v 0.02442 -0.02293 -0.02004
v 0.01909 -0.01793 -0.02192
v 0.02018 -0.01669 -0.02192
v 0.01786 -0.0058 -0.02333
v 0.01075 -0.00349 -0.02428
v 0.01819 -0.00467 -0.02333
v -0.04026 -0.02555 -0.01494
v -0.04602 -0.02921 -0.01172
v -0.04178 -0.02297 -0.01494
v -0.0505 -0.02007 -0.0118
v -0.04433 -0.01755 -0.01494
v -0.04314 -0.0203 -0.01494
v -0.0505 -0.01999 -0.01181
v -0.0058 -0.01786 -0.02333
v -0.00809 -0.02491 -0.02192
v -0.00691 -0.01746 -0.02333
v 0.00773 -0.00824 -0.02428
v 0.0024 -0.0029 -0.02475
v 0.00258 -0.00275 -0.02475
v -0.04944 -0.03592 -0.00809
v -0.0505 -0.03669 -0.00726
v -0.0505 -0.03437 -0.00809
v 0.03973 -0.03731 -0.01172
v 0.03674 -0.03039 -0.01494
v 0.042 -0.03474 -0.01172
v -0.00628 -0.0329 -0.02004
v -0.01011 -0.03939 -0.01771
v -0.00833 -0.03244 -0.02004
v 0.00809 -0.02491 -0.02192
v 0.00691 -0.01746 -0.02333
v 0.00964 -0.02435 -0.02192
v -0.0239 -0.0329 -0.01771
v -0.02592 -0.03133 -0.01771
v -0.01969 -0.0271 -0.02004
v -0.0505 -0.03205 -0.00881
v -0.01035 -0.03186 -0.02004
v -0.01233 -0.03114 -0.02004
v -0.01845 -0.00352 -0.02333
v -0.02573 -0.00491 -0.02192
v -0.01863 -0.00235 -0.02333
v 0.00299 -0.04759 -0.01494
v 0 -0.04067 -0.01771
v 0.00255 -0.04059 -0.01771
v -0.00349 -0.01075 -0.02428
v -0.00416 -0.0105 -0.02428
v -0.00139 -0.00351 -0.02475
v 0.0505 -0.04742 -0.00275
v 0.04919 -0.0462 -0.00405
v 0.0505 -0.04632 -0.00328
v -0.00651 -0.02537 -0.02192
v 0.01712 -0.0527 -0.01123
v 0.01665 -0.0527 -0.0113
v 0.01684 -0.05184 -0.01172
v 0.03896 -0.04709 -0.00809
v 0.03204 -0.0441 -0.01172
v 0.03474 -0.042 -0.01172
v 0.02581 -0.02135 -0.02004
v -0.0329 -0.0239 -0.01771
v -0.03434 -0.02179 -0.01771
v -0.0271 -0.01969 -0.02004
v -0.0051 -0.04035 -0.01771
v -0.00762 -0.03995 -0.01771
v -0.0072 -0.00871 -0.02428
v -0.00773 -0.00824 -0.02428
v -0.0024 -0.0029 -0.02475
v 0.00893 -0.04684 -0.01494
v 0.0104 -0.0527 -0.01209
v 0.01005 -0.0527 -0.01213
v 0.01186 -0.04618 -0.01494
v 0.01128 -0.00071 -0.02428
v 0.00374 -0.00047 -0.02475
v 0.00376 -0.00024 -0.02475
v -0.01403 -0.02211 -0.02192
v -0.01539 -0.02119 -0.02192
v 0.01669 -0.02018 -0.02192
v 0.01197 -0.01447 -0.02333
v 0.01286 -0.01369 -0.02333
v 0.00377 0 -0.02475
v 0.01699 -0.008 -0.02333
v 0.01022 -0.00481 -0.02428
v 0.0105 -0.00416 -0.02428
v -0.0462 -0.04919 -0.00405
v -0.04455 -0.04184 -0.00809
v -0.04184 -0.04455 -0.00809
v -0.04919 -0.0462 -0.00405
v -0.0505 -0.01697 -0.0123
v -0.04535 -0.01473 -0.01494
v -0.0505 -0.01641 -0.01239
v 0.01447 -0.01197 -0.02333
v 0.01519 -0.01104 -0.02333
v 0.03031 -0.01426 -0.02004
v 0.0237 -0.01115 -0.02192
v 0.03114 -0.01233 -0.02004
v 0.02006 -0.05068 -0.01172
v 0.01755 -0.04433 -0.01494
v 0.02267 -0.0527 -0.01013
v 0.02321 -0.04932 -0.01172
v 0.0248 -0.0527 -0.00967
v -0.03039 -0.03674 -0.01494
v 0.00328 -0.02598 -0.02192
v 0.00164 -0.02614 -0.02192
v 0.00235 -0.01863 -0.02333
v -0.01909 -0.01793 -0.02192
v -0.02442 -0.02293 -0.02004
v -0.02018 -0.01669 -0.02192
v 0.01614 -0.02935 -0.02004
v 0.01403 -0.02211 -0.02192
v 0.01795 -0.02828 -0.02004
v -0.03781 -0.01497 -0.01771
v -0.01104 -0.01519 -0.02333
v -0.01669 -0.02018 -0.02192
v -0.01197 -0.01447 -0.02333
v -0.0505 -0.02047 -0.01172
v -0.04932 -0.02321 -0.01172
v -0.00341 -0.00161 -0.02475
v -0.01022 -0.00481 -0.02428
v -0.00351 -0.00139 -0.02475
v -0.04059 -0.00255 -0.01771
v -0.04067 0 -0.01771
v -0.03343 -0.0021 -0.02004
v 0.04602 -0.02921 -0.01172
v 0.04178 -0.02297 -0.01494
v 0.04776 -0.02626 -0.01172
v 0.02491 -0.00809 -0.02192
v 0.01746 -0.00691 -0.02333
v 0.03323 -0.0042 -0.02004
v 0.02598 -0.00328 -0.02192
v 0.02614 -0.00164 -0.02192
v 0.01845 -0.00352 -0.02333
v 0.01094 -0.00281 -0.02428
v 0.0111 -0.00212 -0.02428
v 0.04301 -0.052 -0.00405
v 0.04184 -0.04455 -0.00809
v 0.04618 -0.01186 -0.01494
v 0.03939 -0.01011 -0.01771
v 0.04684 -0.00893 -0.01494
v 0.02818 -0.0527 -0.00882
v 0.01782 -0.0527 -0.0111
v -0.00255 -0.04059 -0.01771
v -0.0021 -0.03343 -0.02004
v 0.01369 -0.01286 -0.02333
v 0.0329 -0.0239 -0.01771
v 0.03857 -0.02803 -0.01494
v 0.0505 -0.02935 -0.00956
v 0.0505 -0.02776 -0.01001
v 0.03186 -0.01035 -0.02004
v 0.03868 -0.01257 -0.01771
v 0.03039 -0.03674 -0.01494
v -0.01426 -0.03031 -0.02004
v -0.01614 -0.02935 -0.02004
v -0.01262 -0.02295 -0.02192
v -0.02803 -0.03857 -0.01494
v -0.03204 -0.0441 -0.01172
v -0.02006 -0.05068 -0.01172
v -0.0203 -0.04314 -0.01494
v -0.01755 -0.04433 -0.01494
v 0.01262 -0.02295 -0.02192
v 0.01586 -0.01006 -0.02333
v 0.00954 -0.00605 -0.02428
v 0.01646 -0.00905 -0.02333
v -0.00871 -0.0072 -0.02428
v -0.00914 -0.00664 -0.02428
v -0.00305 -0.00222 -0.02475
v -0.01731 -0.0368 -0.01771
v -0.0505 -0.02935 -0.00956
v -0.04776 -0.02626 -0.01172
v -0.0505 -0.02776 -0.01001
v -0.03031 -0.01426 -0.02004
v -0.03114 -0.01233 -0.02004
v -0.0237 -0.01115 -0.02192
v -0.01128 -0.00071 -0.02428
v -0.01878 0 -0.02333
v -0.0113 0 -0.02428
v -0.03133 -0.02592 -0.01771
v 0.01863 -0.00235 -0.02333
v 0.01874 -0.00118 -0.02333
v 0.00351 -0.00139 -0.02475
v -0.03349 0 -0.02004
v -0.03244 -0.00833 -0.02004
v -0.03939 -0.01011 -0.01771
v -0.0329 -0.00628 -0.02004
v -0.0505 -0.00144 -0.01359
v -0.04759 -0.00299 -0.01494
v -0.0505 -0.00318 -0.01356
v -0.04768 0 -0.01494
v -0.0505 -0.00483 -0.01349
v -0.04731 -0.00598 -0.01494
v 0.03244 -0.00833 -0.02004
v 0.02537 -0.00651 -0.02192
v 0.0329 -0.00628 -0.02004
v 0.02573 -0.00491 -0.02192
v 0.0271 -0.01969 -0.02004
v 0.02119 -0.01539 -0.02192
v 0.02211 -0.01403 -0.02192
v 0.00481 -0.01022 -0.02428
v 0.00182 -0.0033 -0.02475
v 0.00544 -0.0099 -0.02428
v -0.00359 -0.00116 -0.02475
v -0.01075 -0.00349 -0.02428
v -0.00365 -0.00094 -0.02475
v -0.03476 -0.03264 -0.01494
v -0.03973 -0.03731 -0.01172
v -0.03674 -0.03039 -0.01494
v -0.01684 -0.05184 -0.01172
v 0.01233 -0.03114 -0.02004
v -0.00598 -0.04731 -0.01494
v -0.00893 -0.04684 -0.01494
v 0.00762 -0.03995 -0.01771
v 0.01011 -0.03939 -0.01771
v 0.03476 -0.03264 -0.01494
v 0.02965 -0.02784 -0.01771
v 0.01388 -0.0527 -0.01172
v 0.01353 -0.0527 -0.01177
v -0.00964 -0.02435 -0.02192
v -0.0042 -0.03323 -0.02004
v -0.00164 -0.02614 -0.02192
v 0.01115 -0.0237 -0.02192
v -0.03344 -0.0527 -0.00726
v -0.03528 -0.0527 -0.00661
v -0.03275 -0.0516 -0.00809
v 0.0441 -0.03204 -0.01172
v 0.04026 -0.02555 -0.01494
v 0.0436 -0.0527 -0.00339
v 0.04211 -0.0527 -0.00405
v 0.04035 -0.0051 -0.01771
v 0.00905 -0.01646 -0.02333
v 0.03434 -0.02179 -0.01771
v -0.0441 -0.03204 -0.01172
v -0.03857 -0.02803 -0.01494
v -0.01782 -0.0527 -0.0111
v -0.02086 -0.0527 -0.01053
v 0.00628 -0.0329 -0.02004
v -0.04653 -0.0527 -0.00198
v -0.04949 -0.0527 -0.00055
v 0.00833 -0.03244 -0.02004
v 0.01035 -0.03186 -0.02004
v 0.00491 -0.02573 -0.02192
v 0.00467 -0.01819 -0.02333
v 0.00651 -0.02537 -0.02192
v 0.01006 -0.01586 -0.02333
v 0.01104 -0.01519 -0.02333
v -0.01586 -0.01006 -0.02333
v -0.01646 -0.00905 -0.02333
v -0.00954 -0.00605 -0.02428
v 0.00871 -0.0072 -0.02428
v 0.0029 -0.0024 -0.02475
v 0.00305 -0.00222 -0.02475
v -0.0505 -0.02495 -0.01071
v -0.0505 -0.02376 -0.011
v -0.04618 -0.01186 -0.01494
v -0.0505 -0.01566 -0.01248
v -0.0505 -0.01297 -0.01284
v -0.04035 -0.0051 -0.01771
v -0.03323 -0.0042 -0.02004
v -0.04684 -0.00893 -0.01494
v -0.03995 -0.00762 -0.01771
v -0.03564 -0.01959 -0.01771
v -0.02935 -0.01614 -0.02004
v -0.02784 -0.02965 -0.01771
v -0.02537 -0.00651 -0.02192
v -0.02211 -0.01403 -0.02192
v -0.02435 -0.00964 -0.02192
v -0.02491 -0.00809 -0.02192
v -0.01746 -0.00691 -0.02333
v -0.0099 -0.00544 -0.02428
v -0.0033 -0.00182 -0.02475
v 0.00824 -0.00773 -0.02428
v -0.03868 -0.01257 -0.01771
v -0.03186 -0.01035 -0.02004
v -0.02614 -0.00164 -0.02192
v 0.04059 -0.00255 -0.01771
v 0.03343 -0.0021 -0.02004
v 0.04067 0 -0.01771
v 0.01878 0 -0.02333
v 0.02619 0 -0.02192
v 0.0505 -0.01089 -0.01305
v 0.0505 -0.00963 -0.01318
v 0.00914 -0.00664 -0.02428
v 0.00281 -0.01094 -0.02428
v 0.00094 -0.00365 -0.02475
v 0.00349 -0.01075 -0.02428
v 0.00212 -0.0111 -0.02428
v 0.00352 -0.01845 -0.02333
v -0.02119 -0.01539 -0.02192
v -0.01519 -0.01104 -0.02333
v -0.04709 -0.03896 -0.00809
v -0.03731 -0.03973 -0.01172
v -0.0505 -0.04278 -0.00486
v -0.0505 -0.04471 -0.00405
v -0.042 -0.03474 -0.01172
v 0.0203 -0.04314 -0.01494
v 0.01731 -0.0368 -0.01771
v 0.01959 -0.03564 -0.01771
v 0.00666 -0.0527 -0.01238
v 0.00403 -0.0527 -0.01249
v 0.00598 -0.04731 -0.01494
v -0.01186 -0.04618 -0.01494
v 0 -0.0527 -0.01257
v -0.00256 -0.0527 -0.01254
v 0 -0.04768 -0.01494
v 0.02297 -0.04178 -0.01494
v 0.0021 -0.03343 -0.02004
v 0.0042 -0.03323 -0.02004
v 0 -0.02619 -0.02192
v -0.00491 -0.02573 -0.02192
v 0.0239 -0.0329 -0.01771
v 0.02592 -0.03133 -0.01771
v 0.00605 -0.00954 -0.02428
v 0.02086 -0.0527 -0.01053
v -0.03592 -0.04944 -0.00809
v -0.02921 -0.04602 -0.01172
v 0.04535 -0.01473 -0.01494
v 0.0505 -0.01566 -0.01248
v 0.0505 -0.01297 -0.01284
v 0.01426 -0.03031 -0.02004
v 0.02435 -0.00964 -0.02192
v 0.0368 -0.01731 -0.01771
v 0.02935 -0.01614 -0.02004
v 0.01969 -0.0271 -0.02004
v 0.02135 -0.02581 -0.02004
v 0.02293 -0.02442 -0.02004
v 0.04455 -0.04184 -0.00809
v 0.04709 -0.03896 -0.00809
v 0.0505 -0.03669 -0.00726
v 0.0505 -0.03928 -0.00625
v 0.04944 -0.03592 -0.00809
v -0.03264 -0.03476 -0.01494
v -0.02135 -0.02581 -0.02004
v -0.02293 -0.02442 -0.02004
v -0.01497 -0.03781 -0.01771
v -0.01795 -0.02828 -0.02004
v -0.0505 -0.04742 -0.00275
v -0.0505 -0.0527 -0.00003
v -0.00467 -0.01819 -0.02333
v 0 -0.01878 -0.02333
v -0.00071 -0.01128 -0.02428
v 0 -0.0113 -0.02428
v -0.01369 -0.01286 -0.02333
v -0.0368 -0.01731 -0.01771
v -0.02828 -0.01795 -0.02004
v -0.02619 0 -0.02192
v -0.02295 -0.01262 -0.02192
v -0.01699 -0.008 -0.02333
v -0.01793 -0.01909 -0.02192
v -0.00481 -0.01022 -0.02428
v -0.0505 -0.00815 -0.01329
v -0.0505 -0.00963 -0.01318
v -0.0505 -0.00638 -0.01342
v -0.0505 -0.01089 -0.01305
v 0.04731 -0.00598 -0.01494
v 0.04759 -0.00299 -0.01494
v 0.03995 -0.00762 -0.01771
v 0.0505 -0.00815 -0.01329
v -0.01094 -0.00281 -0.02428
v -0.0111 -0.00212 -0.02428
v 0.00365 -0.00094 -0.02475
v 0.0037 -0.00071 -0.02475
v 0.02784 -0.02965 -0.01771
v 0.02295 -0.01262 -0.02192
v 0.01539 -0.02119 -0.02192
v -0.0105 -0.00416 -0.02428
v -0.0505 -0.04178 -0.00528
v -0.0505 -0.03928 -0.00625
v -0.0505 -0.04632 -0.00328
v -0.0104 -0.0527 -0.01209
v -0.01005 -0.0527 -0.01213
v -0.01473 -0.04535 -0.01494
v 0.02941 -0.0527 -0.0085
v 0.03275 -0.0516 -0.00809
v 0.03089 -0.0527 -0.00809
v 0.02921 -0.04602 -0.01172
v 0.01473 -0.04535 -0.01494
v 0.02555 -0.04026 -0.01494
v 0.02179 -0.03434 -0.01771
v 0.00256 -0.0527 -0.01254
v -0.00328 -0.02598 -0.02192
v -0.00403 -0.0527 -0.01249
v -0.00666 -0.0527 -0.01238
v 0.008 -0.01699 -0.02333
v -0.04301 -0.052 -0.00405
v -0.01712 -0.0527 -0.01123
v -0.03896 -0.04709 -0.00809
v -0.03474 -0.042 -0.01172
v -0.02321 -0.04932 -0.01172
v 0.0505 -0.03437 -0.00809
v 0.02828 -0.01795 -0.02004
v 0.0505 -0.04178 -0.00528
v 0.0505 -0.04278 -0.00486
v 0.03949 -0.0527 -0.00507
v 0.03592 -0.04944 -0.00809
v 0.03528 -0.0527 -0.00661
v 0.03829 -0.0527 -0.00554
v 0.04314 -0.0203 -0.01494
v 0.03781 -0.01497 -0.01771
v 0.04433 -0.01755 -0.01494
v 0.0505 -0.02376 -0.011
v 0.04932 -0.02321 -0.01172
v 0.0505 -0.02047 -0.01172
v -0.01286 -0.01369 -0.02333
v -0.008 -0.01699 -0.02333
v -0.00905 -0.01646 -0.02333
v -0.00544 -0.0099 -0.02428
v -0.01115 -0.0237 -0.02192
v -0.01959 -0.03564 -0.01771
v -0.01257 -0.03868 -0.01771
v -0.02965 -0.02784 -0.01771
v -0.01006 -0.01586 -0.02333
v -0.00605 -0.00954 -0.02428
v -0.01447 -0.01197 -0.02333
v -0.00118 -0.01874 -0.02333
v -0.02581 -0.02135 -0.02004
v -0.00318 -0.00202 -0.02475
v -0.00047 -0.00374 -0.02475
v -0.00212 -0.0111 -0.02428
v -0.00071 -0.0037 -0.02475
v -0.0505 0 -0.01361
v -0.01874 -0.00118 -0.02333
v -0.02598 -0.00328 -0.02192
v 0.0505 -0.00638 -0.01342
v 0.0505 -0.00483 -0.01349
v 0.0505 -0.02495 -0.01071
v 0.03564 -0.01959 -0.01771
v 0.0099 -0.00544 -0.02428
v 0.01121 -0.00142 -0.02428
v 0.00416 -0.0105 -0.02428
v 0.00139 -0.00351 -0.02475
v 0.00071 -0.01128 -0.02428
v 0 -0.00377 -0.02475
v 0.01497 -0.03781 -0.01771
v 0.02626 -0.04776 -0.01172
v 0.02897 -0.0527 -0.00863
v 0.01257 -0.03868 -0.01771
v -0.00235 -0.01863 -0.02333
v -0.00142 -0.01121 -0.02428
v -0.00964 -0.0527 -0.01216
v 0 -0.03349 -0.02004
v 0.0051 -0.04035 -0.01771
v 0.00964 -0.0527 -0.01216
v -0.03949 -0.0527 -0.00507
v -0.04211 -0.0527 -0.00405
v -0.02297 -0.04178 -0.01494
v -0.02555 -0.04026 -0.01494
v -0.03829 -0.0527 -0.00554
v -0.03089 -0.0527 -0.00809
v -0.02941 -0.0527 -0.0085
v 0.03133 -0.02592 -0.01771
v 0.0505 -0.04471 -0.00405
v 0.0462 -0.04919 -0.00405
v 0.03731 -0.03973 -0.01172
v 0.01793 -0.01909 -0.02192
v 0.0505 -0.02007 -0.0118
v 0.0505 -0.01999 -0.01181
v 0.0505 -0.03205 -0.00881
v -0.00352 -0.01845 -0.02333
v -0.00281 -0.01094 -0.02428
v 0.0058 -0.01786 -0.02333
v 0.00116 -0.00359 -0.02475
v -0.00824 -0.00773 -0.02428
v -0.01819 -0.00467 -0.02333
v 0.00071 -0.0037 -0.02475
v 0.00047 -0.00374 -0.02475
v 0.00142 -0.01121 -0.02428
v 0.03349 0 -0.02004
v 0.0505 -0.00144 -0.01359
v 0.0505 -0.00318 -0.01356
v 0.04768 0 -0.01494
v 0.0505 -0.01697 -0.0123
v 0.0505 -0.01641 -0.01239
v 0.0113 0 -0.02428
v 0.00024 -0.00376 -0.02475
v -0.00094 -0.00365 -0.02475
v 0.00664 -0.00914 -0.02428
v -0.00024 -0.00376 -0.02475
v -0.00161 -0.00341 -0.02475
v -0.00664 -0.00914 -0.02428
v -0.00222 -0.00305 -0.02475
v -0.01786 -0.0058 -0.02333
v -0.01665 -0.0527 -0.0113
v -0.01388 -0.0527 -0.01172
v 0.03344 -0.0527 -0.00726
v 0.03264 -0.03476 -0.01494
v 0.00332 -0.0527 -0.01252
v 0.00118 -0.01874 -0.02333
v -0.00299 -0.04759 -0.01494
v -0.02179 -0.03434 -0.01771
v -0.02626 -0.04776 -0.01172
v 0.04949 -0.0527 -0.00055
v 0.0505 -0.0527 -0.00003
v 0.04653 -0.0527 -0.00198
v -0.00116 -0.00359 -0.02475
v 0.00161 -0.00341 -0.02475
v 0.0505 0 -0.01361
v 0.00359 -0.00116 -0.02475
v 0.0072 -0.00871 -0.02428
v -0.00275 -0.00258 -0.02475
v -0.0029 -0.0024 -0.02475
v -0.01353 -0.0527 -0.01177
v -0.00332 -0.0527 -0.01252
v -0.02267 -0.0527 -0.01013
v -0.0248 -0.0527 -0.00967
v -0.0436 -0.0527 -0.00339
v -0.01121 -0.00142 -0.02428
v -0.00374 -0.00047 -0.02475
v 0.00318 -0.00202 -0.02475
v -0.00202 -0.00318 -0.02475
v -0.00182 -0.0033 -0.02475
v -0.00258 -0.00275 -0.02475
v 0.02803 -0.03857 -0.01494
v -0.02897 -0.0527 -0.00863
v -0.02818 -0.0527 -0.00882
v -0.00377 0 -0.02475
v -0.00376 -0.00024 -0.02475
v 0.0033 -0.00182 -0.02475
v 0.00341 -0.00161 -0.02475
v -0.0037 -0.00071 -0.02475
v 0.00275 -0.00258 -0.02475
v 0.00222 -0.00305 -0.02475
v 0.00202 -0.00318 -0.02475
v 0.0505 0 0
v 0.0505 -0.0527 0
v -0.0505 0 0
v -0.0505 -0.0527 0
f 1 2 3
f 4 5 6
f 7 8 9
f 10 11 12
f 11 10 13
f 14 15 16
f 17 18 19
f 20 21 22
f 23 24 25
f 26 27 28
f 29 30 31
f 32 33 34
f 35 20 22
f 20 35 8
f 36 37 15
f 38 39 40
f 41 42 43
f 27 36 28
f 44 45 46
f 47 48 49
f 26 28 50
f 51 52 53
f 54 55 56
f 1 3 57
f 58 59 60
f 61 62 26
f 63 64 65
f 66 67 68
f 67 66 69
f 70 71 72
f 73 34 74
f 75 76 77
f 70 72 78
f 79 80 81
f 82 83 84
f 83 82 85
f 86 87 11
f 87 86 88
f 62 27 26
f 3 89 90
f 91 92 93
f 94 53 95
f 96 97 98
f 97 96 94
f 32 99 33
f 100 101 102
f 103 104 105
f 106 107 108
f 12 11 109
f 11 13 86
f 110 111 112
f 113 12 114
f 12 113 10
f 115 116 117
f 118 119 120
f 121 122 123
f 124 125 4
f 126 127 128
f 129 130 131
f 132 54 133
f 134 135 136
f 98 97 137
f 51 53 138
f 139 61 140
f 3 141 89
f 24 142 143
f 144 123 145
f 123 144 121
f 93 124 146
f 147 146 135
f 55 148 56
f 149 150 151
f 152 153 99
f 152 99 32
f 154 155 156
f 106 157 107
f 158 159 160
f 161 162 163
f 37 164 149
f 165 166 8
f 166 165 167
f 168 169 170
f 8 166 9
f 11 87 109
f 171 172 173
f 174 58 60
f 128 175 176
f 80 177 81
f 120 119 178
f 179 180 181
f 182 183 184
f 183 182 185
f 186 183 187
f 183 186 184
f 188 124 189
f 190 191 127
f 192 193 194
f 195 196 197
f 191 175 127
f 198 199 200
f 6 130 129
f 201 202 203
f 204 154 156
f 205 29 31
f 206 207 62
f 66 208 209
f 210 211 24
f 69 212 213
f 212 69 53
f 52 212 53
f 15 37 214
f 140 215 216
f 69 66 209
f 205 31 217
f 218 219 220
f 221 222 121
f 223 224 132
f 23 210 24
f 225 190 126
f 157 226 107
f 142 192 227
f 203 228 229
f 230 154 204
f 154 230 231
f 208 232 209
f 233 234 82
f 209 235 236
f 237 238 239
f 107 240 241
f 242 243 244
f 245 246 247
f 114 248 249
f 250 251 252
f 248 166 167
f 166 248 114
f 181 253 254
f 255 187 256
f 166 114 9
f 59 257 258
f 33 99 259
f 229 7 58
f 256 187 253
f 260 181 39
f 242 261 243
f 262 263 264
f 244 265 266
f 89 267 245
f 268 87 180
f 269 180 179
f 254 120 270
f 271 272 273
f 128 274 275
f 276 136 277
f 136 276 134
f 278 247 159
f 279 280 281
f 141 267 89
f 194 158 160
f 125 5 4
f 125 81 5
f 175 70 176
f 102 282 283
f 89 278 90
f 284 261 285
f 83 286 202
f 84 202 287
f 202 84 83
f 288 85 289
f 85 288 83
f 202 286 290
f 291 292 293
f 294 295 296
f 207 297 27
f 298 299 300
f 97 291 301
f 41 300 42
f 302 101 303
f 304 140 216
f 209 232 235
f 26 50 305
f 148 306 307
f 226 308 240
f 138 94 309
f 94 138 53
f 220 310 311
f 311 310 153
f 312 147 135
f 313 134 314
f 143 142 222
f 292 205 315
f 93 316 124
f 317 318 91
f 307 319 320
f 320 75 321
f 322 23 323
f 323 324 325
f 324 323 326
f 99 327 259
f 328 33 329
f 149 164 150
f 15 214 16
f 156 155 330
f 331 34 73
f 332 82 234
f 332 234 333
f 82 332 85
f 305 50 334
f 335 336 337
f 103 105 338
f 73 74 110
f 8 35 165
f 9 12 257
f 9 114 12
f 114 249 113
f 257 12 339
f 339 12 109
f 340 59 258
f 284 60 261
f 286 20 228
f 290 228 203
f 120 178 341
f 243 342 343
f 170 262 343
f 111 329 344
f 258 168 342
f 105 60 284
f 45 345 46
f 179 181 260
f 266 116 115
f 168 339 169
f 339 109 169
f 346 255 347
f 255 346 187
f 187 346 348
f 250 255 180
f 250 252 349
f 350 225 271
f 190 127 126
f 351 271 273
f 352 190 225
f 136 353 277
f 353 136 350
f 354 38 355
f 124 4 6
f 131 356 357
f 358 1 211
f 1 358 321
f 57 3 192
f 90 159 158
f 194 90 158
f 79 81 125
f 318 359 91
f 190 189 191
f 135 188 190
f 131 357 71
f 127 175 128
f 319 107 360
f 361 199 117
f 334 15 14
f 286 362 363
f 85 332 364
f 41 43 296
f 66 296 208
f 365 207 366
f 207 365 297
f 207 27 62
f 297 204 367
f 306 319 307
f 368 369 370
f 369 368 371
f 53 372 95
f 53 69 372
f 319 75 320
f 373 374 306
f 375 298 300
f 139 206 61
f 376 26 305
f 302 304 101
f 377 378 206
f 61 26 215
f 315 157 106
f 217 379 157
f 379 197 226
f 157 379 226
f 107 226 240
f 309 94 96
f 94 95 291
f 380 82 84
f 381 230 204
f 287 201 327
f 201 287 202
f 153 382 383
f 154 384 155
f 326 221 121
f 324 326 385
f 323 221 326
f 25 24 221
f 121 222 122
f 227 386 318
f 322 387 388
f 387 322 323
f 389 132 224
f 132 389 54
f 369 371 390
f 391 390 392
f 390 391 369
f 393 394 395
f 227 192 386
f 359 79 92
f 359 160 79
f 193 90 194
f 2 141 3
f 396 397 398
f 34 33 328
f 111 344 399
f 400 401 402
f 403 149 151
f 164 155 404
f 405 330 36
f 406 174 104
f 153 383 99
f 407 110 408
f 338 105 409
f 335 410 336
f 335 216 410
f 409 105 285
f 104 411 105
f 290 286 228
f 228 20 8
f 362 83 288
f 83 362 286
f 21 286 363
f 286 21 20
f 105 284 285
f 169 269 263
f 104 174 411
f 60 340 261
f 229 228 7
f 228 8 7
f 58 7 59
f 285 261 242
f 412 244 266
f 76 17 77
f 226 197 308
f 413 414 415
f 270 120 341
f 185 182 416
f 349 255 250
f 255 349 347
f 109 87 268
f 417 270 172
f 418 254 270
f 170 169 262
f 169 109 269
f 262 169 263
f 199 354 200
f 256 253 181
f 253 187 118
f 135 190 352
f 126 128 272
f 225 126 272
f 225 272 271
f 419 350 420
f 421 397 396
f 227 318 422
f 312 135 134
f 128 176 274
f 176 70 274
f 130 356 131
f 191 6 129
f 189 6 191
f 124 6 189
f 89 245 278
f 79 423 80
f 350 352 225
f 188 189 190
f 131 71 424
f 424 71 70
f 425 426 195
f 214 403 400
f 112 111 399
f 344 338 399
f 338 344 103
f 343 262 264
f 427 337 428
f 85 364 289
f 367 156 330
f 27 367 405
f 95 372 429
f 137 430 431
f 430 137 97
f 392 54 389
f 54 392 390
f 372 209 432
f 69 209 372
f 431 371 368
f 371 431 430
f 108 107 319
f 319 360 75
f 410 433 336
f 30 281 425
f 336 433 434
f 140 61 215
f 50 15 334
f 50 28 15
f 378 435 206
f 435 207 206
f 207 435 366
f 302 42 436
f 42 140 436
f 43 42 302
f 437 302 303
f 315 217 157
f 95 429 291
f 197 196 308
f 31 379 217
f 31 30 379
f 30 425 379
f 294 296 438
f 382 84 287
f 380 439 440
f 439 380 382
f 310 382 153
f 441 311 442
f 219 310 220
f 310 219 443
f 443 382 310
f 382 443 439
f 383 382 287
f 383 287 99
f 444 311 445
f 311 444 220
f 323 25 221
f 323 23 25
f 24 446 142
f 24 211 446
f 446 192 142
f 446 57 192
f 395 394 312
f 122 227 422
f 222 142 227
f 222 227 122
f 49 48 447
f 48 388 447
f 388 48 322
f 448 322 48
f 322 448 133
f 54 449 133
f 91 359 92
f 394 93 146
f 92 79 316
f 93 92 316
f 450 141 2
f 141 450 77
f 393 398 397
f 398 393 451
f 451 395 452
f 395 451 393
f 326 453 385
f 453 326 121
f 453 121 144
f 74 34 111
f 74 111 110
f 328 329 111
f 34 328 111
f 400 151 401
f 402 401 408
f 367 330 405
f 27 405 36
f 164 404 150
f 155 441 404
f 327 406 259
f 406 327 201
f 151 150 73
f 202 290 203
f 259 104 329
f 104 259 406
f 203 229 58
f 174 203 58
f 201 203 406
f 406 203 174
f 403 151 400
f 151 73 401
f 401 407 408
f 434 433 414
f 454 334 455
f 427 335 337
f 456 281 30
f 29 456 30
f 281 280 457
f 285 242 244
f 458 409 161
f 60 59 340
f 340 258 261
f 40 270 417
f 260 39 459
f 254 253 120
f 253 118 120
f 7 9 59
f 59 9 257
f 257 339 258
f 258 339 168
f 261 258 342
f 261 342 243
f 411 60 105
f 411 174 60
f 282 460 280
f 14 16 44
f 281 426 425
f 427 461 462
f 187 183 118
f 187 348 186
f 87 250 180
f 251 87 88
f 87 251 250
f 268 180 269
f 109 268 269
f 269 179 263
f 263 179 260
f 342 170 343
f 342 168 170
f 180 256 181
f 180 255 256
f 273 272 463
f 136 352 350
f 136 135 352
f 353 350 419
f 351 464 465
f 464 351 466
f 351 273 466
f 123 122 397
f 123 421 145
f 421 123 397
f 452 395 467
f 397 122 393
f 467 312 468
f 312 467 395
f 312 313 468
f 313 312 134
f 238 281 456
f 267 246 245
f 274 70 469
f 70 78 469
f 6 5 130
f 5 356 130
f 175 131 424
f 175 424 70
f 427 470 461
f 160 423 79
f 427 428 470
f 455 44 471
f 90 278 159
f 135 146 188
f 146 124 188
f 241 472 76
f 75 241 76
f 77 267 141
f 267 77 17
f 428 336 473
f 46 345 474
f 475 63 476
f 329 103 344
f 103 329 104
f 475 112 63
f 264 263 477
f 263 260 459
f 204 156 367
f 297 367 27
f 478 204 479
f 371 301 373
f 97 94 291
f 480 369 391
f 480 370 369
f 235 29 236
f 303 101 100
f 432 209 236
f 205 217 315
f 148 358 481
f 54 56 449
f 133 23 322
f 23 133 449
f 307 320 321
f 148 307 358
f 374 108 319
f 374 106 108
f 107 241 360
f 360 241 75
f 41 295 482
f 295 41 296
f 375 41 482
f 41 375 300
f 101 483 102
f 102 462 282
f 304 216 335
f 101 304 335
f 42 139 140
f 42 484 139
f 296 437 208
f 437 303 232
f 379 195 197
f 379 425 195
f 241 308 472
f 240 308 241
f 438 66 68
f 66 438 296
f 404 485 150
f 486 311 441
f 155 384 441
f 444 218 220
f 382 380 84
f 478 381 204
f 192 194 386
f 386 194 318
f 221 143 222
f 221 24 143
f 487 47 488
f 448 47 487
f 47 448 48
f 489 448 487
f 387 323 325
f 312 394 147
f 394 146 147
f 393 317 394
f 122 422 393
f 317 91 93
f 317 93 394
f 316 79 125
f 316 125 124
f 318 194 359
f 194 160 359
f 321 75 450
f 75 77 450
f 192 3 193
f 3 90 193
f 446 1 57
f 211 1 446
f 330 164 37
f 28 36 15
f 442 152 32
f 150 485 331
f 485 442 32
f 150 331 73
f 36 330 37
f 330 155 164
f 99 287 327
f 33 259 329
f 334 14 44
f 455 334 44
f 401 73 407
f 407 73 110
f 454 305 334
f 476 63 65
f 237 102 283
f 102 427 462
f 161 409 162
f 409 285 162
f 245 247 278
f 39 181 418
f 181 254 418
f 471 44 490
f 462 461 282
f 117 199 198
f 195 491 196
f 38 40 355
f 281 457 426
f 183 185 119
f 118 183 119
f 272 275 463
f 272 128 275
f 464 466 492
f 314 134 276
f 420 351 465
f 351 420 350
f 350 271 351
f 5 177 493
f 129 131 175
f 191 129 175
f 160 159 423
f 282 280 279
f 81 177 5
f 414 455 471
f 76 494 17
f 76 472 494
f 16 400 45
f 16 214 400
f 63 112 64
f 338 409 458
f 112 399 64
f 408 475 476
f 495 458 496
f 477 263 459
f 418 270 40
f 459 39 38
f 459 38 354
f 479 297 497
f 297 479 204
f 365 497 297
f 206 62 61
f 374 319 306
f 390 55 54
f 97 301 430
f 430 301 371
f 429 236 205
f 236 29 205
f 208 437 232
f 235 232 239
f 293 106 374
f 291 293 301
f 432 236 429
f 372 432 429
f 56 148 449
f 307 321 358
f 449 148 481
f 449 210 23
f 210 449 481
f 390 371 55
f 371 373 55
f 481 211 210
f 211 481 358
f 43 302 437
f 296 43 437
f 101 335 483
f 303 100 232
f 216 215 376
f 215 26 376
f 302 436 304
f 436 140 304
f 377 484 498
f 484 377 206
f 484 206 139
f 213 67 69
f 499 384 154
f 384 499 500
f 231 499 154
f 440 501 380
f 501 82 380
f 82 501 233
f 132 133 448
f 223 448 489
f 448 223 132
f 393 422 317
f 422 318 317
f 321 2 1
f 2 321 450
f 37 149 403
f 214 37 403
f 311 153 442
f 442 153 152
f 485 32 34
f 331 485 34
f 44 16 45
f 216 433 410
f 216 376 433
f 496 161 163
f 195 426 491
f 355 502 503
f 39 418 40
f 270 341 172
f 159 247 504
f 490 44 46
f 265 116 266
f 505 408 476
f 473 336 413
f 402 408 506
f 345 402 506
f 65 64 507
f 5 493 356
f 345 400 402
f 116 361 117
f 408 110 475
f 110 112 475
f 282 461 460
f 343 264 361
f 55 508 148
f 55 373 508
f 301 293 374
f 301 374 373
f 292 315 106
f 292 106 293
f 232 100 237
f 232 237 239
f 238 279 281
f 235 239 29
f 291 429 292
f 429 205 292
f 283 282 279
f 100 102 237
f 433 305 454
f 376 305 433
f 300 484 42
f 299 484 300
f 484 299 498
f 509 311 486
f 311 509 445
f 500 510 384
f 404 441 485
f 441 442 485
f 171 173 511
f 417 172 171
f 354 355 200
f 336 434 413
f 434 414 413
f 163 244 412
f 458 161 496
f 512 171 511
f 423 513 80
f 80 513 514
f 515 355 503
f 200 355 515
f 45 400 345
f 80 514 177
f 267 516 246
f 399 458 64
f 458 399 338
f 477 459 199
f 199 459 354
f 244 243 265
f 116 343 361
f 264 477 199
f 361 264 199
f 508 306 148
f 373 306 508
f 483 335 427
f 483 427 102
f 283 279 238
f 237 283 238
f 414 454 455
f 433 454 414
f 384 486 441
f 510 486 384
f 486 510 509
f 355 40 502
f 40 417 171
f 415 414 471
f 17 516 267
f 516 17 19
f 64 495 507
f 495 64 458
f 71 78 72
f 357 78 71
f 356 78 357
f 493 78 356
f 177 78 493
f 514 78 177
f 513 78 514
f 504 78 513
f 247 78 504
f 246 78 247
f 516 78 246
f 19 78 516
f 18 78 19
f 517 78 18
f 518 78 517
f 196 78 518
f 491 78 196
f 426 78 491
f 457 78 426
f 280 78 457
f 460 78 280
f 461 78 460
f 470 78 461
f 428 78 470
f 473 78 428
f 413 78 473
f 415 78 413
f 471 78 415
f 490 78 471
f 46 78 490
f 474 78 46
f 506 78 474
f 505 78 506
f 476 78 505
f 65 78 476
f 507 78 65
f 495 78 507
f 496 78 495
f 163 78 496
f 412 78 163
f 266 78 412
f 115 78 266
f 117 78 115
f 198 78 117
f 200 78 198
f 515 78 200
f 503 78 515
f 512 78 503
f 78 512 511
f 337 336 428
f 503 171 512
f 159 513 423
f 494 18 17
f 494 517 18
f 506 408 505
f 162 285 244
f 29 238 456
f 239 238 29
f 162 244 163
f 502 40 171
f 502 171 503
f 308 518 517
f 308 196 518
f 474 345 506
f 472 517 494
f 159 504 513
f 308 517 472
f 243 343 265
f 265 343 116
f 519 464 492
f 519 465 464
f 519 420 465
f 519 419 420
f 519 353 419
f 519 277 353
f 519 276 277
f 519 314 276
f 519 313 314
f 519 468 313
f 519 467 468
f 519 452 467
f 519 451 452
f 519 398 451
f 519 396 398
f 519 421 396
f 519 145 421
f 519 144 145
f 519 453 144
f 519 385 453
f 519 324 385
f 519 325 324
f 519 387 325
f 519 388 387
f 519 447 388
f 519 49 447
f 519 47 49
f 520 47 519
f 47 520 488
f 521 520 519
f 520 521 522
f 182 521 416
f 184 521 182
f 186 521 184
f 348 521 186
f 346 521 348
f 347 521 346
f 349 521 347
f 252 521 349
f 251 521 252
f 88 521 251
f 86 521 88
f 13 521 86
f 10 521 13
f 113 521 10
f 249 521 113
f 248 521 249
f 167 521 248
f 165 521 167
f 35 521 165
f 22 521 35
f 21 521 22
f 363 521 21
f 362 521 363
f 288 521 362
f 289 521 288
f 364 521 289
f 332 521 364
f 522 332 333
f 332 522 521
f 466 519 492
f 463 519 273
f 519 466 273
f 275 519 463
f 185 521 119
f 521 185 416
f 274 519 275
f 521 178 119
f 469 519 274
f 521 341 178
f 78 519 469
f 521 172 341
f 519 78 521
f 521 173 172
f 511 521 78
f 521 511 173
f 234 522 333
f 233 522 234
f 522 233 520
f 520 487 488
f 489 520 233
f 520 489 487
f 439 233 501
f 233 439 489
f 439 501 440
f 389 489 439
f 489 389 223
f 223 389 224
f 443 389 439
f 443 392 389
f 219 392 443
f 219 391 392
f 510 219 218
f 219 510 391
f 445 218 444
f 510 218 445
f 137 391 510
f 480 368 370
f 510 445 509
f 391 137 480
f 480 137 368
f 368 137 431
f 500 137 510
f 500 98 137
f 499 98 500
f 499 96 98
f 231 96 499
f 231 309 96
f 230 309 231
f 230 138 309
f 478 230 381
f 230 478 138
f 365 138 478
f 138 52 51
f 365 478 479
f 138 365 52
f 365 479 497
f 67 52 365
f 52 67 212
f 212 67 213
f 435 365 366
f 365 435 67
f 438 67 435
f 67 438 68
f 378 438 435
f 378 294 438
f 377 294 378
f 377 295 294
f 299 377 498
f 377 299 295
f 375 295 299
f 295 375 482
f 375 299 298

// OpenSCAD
// file: feet_vars.scad
            // Ellipsoid diameters
            X = 0.24; // x span
            Y = 0.24; // y span
            Z = 0.24; // z span

            // boolean for left/right foot
            left_foot = -1;

            // feet box size
            box_x = 0.101;
            box_y = 0.0527;
// main file
include<feet_vars.scad>

// Semi-axes
a = X/2; 
b = Y/2; 
c = Z/2;

hx = box_x/2;
hy = box_y/2;

// z_height of foot determined by sqaure intersection
z_top = c * sqrt(1 - (hx*hx)/(a*a) - (box_y*box_y)/(b*b));
// Box runs from z = -c up to z_top
box_z0 = -c;
box_height = c - z_top;

translate([0,0,c - box_height])
// Intersection
intersection() {
  resize([X, Y, Z]) sphere(r = 1, $fn = 100);
  translate([ 0, left_foot * hy, box_height/2 - c])
    cube([ box_x, box_y, box_height ], center = true);
}
